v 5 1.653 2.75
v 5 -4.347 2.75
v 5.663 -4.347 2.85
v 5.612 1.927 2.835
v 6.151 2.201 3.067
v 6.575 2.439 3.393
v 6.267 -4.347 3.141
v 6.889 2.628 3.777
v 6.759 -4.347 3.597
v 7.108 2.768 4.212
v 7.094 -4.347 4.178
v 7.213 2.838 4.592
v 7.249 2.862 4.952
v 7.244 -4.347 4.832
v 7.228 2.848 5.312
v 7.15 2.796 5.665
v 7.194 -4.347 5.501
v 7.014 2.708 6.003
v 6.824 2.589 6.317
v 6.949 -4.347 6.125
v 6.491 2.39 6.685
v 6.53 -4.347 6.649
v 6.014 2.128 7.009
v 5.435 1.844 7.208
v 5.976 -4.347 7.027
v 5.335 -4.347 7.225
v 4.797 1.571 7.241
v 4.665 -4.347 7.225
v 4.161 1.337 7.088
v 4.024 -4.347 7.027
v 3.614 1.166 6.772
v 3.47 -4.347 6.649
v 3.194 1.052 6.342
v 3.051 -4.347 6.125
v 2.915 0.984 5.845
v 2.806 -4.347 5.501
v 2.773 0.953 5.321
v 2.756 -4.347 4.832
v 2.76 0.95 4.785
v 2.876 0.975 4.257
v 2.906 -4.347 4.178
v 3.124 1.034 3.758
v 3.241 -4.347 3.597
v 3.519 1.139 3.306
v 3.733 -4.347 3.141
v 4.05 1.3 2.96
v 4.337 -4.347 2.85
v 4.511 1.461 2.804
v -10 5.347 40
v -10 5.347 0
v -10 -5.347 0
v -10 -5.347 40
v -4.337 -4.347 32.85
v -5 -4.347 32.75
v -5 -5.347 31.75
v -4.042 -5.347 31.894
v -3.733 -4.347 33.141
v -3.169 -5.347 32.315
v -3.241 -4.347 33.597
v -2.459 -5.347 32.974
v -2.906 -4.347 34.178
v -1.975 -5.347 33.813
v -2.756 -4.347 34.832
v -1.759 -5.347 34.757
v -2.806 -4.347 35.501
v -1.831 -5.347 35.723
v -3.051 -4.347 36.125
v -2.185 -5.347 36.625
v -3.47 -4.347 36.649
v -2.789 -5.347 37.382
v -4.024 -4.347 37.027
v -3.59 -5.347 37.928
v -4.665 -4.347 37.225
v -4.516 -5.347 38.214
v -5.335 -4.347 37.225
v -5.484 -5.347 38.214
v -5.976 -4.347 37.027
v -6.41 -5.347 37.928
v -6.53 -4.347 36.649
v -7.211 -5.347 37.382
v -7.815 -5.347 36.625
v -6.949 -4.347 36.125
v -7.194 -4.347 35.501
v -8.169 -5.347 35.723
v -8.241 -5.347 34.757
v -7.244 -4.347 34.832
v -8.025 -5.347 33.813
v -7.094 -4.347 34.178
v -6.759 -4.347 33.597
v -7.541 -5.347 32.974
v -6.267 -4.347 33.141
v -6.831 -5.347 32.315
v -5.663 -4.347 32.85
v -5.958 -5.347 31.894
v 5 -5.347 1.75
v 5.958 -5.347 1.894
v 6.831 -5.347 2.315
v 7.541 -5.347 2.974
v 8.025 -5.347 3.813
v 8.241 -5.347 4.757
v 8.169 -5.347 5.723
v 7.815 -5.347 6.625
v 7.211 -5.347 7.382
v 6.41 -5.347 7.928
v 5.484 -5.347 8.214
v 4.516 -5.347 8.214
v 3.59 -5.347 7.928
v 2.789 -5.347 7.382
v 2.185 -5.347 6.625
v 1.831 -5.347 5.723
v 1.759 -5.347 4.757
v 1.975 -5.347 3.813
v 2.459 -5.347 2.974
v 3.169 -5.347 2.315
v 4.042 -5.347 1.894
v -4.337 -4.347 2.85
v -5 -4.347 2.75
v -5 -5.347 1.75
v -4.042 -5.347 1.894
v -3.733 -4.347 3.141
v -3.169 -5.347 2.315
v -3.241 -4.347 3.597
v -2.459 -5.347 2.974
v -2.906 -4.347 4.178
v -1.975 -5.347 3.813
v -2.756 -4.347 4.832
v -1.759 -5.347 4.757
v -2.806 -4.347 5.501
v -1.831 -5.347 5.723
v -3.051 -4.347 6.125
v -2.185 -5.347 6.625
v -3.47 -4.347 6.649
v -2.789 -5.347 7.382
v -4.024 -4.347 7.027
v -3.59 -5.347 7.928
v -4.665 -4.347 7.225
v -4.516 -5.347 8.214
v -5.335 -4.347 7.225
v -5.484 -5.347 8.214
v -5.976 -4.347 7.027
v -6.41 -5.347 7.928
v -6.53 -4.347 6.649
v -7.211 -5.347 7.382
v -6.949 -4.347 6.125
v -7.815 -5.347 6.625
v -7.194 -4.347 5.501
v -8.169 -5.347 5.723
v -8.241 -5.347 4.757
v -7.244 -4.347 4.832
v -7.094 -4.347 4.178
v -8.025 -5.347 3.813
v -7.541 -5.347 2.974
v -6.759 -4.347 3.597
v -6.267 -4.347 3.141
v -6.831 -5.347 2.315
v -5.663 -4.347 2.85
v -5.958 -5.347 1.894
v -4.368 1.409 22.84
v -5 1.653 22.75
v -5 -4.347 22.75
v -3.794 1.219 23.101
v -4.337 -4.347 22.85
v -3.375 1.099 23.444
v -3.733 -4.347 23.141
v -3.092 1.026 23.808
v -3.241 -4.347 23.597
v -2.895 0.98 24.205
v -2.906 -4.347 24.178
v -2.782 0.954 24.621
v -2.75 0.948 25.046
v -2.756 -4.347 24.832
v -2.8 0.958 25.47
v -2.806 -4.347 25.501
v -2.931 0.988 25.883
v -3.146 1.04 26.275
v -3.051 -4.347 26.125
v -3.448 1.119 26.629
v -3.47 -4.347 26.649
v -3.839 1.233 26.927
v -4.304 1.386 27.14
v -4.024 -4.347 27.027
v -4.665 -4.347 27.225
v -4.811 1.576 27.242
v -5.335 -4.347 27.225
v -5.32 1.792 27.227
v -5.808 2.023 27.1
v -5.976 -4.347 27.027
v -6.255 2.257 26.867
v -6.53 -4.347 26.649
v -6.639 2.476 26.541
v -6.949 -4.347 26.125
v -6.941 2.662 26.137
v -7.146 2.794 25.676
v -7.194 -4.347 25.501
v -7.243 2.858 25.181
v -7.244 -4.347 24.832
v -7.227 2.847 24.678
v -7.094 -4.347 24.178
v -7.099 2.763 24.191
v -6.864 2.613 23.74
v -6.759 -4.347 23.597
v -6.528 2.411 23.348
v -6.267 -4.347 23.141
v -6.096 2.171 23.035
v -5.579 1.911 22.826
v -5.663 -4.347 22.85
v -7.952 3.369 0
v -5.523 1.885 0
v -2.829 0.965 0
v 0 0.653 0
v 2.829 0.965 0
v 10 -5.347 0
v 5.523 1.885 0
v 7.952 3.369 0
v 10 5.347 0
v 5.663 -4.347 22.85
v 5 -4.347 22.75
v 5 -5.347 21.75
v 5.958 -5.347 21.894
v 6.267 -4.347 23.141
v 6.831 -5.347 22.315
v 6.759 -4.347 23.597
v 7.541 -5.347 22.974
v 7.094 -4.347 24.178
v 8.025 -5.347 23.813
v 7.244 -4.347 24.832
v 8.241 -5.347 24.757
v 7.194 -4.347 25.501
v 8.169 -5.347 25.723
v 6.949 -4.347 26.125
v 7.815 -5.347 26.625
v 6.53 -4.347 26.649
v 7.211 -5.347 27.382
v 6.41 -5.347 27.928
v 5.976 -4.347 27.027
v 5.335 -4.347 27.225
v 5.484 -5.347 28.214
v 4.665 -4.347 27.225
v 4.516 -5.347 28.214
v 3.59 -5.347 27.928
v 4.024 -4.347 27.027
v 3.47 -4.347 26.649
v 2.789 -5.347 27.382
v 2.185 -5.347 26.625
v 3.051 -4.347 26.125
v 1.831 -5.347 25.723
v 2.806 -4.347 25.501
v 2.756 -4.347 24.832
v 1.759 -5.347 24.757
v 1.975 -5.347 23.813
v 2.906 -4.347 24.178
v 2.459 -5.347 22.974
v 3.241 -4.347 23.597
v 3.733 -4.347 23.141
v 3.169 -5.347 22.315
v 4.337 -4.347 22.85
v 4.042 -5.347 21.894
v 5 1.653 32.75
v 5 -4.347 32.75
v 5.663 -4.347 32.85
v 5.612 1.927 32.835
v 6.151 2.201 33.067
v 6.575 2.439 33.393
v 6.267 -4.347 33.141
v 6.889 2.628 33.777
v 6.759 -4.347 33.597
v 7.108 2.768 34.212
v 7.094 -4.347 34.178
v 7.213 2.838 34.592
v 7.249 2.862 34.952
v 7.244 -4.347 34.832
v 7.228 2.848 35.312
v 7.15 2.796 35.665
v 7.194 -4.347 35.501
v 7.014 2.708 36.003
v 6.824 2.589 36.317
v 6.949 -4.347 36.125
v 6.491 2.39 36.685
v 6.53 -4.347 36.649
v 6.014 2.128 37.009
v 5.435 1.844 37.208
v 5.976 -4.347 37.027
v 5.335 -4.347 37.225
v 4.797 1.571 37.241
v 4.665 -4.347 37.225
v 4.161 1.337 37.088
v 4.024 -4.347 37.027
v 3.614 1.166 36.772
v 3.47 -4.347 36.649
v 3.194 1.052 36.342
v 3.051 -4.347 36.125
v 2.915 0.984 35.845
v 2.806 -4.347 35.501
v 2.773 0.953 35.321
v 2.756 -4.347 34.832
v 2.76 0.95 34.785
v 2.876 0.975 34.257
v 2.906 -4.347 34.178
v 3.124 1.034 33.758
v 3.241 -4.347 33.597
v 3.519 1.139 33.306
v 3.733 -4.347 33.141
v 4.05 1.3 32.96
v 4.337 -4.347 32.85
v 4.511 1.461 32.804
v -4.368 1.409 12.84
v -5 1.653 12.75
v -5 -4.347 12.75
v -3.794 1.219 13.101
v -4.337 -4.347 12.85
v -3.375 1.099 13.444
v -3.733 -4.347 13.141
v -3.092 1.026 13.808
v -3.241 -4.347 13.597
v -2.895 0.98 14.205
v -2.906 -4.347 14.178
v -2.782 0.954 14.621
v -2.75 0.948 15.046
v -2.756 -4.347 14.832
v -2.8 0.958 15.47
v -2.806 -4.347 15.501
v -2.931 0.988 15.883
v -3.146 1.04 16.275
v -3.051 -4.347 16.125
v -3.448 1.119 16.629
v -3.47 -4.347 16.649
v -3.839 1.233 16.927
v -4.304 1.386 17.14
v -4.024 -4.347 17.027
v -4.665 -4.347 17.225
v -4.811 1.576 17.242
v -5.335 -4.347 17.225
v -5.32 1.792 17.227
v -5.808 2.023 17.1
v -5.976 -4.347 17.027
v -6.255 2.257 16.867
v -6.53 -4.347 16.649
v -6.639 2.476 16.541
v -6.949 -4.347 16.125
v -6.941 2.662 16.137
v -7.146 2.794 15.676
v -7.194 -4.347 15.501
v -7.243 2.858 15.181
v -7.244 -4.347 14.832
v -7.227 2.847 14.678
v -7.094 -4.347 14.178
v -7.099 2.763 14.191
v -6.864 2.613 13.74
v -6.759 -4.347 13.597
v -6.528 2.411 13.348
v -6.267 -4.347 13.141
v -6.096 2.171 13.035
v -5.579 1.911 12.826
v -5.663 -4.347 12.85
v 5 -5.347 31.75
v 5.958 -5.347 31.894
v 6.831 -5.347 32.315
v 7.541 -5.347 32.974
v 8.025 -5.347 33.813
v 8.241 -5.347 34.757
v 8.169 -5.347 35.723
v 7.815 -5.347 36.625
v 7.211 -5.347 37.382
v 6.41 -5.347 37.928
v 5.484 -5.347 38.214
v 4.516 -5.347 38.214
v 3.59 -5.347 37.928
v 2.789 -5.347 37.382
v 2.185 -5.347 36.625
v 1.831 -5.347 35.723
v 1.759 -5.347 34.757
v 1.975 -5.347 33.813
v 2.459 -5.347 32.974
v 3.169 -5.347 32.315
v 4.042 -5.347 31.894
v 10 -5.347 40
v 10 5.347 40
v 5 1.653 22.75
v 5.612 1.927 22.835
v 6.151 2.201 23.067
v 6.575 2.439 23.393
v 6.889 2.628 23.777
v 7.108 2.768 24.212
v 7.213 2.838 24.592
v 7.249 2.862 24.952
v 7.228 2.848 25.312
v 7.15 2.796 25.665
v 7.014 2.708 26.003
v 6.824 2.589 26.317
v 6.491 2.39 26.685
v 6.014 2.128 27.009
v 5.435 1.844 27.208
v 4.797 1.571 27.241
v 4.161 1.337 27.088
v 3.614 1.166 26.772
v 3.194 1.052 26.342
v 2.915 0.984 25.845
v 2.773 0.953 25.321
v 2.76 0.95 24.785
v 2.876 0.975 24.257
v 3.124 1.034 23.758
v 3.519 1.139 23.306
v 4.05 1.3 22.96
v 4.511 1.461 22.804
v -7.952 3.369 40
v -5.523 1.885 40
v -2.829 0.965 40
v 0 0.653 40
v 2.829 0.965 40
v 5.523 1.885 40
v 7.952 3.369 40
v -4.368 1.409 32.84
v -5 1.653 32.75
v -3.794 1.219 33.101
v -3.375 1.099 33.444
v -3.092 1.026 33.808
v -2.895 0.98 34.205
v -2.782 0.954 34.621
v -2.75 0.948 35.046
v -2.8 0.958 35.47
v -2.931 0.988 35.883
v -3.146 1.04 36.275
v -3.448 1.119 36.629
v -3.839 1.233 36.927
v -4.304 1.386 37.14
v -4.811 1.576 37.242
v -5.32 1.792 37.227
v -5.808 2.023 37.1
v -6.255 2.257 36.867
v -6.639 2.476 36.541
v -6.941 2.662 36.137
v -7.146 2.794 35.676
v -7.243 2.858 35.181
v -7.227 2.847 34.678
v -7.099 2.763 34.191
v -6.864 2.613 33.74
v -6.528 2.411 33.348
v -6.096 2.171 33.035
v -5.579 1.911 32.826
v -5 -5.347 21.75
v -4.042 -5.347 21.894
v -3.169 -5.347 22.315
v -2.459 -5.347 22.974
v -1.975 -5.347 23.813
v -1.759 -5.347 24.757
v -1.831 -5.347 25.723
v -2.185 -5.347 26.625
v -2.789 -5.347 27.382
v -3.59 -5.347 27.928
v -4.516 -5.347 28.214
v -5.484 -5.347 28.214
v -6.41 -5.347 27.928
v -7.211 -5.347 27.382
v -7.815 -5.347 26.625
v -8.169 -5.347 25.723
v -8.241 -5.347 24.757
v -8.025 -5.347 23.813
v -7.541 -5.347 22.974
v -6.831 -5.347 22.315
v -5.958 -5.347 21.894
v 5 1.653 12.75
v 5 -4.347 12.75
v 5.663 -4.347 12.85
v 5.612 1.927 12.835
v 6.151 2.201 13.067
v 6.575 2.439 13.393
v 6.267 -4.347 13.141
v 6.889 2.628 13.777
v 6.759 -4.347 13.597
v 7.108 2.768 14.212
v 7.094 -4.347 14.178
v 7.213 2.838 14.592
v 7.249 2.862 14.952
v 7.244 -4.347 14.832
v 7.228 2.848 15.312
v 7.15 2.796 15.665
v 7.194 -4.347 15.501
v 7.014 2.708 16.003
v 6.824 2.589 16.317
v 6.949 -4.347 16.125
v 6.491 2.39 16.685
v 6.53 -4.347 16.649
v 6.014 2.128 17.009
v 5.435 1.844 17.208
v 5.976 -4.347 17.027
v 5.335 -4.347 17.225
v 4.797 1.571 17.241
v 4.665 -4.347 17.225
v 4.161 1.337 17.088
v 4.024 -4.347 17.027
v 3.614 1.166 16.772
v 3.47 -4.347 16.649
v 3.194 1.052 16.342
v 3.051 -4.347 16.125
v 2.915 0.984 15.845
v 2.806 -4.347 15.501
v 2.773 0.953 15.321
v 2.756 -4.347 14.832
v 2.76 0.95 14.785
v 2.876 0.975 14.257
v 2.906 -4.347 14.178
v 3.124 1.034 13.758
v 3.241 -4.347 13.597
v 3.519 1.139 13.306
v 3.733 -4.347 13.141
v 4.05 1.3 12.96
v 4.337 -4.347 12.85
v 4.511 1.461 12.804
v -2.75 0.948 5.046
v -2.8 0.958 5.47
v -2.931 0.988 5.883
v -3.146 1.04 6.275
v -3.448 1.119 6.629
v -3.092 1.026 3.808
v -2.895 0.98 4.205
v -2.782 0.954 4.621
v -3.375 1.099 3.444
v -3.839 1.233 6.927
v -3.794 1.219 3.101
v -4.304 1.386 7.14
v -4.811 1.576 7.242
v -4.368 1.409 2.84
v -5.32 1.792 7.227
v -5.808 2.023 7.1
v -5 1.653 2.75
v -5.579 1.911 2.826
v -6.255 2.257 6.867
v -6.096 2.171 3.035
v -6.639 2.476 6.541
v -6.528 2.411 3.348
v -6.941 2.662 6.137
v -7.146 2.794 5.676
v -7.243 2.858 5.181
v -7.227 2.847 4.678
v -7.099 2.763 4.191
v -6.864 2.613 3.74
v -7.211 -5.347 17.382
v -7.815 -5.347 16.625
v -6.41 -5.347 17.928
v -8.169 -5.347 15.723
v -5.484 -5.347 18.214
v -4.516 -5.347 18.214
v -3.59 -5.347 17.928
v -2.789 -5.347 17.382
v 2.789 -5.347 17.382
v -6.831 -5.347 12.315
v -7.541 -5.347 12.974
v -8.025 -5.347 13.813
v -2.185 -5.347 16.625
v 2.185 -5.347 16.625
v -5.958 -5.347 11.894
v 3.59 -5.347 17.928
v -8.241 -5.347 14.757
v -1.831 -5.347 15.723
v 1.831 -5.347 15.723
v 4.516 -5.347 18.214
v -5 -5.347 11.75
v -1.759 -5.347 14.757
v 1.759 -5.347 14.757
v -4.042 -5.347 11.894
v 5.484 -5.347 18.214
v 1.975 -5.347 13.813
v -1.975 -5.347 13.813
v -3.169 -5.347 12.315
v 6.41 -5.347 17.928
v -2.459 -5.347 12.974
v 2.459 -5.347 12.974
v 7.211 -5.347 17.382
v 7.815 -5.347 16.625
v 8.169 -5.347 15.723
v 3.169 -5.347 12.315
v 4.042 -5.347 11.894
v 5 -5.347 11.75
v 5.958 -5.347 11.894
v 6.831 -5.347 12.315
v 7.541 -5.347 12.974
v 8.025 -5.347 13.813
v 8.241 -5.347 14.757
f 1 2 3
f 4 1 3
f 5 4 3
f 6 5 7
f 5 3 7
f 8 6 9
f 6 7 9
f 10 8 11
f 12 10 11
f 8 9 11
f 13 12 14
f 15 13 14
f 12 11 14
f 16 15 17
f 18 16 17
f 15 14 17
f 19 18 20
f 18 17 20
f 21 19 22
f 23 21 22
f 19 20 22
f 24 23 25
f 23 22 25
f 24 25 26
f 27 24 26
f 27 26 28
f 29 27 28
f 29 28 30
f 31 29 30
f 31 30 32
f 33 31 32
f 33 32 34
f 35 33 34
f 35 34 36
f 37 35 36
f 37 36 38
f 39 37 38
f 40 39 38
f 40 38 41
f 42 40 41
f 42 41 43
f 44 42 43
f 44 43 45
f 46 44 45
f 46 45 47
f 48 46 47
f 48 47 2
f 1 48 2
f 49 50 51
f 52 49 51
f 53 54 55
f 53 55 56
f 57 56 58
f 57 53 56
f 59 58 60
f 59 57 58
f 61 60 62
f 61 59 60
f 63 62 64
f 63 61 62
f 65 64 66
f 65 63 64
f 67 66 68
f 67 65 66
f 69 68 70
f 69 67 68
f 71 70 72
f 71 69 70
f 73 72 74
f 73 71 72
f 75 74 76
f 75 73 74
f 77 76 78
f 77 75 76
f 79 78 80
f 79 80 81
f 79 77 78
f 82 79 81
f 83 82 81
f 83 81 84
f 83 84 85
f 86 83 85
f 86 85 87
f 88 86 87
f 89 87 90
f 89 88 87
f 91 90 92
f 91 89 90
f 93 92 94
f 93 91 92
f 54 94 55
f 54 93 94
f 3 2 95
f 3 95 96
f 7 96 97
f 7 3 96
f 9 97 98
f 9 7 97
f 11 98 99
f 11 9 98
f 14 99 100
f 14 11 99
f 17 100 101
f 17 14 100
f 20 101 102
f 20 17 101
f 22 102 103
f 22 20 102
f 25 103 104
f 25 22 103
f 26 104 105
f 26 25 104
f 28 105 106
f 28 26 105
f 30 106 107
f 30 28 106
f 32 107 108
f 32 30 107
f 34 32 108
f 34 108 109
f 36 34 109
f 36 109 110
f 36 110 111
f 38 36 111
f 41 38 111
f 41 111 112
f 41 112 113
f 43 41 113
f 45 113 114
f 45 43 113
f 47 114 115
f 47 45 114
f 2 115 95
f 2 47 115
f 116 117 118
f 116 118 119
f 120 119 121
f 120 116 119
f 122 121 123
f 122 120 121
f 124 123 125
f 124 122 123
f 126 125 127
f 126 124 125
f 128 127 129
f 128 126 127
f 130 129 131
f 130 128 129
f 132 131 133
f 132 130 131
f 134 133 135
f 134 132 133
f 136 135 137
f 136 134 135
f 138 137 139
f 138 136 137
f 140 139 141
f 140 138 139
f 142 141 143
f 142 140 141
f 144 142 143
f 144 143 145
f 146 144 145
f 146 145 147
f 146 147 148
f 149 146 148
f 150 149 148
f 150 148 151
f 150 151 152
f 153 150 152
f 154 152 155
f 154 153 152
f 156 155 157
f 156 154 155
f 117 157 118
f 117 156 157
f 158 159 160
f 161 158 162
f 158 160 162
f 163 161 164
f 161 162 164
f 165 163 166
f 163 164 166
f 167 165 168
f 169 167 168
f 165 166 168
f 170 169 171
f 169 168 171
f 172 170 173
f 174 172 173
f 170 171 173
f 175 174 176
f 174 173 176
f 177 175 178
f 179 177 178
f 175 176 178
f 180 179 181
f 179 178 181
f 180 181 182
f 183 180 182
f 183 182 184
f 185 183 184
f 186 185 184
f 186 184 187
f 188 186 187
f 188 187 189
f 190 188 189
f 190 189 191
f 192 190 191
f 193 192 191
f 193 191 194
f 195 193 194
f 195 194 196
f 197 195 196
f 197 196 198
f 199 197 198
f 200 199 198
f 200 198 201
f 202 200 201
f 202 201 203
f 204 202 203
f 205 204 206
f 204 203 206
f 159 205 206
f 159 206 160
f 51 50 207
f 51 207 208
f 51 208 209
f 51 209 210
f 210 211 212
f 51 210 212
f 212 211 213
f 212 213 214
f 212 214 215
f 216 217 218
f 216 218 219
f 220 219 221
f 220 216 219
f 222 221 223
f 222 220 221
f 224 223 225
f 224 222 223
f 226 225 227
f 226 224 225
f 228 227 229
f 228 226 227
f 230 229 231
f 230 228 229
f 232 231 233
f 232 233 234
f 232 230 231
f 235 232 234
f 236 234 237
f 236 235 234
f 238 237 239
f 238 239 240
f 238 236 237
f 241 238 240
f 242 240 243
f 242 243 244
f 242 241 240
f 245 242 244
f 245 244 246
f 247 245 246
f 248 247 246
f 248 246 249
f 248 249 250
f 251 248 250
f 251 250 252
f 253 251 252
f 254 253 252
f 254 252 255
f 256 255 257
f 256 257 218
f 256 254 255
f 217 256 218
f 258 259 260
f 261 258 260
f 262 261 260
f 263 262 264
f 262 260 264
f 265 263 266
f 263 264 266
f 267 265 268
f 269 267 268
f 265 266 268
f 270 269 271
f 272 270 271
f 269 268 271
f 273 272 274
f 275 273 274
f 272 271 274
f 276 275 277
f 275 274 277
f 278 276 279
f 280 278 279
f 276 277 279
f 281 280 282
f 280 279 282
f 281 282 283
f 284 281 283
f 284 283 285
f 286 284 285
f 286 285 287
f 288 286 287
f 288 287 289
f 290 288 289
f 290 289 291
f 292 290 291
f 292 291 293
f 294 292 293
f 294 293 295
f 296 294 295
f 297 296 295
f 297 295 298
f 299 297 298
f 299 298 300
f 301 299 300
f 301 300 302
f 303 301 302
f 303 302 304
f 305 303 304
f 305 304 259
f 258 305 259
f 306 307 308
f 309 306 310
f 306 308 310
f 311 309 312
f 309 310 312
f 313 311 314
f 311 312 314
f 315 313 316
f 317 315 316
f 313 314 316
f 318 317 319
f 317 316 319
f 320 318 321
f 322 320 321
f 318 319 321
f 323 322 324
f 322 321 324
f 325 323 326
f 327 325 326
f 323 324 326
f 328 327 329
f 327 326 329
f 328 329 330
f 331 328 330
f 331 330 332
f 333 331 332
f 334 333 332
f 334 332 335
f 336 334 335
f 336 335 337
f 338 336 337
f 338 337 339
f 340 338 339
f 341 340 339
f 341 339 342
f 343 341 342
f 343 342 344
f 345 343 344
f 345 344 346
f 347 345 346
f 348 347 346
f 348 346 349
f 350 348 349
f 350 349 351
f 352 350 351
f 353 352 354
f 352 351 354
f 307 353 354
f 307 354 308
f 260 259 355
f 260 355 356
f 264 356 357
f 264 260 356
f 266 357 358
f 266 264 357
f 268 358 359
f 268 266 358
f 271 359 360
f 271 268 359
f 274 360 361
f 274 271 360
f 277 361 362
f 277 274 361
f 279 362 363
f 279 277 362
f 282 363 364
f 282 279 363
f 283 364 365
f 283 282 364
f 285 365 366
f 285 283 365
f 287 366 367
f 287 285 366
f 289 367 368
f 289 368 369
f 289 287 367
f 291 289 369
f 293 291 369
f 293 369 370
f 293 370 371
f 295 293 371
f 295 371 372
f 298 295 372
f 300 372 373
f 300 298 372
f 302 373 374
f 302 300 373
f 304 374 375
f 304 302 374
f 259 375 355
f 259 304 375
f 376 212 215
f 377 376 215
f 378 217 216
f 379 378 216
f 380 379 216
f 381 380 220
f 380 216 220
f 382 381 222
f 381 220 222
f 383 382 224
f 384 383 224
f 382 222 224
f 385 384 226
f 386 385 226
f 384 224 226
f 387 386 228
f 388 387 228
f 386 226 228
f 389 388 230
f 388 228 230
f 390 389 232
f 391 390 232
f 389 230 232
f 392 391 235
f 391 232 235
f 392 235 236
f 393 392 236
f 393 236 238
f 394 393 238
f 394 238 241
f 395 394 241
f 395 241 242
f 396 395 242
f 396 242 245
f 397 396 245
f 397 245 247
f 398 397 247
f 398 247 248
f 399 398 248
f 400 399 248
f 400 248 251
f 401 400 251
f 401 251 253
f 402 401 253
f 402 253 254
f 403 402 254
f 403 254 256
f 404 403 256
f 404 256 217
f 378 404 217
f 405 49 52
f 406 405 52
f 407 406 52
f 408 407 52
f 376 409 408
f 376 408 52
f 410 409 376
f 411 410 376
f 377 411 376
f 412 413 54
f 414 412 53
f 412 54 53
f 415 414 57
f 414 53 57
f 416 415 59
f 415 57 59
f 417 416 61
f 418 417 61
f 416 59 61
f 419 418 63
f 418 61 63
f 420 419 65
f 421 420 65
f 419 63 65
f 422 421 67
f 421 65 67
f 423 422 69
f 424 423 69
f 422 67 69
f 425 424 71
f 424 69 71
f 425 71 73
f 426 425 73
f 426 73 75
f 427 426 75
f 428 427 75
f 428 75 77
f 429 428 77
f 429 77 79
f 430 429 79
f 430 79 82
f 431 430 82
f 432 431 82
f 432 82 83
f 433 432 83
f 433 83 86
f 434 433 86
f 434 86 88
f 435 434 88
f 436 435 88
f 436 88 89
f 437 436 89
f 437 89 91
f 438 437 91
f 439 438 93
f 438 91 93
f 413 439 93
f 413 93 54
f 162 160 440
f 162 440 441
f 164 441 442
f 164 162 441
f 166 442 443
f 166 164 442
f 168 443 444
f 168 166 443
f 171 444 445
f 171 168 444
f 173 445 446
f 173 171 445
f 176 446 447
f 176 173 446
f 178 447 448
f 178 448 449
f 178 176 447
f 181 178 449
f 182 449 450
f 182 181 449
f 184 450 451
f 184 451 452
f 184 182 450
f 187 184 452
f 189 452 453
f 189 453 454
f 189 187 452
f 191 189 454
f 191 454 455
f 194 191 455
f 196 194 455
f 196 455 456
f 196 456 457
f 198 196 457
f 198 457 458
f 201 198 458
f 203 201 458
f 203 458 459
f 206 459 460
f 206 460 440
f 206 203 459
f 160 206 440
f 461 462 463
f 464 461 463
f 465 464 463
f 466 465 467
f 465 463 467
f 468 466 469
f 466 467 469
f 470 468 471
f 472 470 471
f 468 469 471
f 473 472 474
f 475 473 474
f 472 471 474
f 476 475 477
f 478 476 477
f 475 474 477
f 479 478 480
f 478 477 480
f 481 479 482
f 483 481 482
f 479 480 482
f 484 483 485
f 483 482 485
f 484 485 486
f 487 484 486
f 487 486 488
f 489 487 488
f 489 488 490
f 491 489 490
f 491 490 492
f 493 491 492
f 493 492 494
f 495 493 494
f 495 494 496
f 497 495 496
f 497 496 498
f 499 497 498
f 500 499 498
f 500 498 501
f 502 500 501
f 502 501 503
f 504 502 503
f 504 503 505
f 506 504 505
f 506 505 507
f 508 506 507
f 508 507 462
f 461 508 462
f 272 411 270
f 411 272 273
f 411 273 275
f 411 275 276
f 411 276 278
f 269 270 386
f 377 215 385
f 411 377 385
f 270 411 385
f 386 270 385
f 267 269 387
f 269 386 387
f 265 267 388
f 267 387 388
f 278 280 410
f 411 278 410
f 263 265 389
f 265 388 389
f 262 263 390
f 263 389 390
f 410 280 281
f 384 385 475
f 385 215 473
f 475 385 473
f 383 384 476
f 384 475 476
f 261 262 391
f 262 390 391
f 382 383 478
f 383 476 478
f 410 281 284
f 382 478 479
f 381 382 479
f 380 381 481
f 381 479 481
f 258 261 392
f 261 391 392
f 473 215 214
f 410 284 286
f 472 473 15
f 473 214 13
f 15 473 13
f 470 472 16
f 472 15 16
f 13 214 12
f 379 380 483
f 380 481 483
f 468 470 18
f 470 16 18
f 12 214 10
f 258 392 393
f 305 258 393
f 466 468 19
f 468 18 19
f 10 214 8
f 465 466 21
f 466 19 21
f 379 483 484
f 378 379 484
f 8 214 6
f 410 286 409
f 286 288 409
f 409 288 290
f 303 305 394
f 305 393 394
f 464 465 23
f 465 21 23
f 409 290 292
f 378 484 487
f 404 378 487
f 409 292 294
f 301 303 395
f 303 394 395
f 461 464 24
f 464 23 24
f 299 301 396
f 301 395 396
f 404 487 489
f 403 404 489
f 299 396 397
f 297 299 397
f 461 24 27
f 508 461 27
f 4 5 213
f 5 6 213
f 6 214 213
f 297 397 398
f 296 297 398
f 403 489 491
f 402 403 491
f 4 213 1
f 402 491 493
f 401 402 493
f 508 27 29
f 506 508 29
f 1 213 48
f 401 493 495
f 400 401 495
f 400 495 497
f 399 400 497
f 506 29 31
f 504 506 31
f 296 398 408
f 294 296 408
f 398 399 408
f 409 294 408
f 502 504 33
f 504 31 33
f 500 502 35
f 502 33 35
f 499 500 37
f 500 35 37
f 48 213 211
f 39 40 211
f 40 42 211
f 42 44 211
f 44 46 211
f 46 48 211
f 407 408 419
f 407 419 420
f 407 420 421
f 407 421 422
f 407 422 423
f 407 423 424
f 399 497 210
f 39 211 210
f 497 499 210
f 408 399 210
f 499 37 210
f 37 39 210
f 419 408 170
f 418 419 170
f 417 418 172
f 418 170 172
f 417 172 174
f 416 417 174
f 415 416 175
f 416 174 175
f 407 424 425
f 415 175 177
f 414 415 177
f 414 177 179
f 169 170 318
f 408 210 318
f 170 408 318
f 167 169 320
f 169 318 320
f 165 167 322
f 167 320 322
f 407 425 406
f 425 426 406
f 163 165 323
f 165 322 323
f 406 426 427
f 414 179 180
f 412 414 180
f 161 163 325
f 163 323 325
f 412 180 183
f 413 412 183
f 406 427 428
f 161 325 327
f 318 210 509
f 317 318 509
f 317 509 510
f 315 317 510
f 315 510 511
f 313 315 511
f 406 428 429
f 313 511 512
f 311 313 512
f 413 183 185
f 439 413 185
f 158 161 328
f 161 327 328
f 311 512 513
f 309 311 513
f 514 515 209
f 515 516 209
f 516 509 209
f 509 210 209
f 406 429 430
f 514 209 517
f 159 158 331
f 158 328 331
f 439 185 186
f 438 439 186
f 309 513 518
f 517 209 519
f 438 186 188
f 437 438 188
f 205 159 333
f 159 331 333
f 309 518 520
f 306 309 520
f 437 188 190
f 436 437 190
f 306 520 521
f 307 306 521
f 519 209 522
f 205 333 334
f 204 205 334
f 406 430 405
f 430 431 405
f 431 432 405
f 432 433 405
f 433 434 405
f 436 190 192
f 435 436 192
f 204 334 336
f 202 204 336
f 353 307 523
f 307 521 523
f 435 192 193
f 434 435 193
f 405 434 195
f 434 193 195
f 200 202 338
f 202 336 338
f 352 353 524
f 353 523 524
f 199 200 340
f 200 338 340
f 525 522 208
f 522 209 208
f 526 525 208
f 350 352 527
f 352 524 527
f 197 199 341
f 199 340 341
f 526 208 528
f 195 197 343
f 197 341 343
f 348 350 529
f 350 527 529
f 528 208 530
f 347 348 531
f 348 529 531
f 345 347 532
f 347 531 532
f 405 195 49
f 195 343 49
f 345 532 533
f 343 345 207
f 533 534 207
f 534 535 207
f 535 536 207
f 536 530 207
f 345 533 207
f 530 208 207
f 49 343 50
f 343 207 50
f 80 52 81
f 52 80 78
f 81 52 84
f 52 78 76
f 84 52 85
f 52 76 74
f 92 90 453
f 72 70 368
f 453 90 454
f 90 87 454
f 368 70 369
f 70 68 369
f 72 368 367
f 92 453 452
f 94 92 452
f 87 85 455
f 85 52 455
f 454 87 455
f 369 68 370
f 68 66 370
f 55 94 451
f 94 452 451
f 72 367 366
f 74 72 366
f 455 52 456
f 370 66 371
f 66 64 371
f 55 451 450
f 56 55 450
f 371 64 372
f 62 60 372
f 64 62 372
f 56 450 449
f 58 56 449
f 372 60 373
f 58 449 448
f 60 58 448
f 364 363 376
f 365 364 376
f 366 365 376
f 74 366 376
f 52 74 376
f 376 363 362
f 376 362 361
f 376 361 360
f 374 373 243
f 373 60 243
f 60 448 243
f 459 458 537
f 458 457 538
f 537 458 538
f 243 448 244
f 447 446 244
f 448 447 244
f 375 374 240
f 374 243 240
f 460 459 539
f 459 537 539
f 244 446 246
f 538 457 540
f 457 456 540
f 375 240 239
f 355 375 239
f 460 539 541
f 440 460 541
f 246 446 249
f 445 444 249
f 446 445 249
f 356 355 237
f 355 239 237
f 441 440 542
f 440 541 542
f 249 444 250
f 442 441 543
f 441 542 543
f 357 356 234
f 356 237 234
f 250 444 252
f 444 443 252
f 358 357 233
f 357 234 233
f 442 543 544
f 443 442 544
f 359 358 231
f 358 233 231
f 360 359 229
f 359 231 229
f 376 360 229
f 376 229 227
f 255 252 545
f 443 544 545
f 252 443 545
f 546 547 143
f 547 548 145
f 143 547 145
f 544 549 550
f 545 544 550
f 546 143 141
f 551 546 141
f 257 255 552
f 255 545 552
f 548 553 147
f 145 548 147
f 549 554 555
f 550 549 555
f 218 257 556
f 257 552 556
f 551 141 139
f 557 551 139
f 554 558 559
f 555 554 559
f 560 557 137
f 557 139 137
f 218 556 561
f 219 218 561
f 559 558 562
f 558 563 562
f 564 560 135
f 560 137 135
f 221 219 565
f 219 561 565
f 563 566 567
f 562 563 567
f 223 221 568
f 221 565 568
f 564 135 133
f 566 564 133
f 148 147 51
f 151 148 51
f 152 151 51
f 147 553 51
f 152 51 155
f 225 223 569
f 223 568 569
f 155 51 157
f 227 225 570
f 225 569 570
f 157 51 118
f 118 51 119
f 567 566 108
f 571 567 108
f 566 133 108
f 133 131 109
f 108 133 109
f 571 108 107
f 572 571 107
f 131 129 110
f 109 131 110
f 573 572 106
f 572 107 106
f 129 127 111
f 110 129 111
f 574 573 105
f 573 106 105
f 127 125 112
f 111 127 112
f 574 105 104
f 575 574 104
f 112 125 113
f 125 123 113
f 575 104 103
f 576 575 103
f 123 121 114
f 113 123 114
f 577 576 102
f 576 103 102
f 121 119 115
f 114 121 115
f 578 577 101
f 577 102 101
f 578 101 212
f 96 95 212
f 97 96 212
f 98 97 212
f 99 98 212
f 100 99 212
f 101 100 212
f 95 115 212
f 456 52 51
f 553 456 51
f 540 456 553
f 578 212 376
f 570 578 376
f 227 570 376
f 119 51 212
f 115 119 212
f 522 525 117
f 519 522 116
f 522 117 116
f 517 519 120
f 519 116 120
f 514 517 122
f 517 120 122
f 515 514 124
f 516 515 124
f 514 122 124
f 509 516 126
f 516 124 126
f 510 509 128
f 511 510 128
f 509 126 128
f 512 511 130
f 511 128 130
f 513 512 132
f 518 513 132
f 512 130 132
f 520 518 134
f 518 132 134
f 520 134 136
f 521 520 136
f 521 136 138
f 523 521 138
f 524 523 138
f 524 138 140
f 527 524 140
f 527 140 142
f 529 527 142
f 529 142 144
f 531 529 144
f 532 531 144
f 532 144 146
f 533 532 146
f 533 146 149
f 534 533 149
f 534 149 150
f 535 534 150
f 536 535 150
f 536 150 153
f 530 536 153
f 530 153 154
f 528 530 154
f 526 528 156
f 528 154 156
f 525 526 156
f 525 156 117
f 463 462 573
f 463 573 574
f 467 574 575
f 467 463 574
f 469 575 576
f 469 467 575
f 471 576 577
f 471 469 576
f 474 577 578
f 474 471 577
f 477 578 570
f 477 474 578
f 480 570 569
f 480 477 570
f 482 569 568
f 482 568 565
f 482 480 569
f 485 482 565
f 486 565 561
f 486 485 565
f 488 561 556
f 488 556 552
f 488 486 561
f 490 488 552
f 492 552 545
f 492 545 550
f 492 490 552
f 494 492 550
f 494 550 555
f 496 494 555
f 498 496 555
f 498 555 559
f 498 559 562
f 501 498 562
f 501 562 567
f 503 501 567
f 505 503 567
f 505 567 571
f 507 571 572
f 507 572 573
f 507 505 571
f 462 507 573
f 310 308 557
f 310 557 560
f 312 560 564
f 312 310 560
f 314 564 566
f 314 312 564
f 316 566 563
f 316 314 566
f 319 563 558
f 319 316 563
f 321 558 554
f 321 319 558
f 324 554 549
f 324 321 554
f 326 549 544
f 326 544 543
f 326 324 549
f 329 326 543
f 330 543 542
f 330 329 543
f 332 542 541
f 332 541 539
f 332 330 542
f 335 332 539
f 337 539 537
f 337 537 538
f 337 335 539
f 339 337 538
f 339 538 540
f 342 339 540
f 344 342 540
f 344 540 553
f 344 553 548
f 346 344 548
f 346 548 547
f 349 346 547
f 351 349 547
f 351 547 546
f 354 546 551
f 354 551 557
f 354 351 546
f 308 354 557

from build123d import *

# Parameters (mm, degrees)
BOSS_EXTRUDE1_DEPTH = 40
SKETCH2_R           = 2.25
CUT_EXTRUDE1_DEPTH  = 43.595167487
CHAMFER1_SIZE       = 1


with BuildPart() as part:
    # Sketch1 → Boss-Extrude1 (new body)
    with BuildSketch(Plane.XY):
        with BuildLine():
            Line((-10, -5.346688069), (10, -5.346688069))
            Line((10, -5.346688069), (10, 5.346688069))
            ThreePointArc((10, 5.346688069), (0, 0.653311931), (-10, 5.346688069))
            Line((-10, 5.346688069), (-10, -5.346688069))
        make_face()
    extrude(amount=BOSS_EXTRUDE1_DEPTH)

    # Sketch2 → Cut-Extrude1 (cut, through all)
    with BuildSketch(Plane.XZ.offset(5.346688069)):
        with Locations(Location((5, 5, 0), (0, 0, 270))):
            Circle(SKETCH2_R)
        with Locations(Location((-5, 5, 0), (0, 0, 270))):
            Circle(SKETCH2_R)
        with Locations(Location((-5, 15, 0), (0, 0, 270))):
            Circle(SKETCH2_R)
        with Locations(Location((5, 15, 0), (0, 0, 270))):
            Circle(SKETCH2_R)
        with Locations(Location((-5, 25, 0), (0, 0, 270))):
            Circle(SKETCH2_R)
        with Locations(Location((5, 25, 0), (0, 0, 270))):
            Circle(SKETCH2_R)
        with Locations(Location((-5, 35, 0), (0, 0, 270))):
            Circle(SKETCH2_R)
        with Locations(Location((5, 35, 0), (0, 0, 270))):
            Circle(SKETCH2_R)
    extrude(amount=-CUT_EXTRUDE1_DEPTH, mode=Mode.SUBTRACT)

    # Chamfer1
    chamfer1_edges = [part.edges().sort_by_distance(p)[0] for p in [
        (5, -5.346688069, 27.25),
        (-5, -5.346688069, 17.25),
        (5, -5.346688069, 17.25),
        (-5, -5.346688069, 7.25),
        (-5, -5.346688069, 37.25),
        (5, -5.346688069, 37.25),
        (-5, -5.346688069, 27.25),
        (5, -5.346688069, 7.25),
    ]]
    chamfer(chamfer1_edges, length=CHAMFER1_SIZE)


solid = part.part
